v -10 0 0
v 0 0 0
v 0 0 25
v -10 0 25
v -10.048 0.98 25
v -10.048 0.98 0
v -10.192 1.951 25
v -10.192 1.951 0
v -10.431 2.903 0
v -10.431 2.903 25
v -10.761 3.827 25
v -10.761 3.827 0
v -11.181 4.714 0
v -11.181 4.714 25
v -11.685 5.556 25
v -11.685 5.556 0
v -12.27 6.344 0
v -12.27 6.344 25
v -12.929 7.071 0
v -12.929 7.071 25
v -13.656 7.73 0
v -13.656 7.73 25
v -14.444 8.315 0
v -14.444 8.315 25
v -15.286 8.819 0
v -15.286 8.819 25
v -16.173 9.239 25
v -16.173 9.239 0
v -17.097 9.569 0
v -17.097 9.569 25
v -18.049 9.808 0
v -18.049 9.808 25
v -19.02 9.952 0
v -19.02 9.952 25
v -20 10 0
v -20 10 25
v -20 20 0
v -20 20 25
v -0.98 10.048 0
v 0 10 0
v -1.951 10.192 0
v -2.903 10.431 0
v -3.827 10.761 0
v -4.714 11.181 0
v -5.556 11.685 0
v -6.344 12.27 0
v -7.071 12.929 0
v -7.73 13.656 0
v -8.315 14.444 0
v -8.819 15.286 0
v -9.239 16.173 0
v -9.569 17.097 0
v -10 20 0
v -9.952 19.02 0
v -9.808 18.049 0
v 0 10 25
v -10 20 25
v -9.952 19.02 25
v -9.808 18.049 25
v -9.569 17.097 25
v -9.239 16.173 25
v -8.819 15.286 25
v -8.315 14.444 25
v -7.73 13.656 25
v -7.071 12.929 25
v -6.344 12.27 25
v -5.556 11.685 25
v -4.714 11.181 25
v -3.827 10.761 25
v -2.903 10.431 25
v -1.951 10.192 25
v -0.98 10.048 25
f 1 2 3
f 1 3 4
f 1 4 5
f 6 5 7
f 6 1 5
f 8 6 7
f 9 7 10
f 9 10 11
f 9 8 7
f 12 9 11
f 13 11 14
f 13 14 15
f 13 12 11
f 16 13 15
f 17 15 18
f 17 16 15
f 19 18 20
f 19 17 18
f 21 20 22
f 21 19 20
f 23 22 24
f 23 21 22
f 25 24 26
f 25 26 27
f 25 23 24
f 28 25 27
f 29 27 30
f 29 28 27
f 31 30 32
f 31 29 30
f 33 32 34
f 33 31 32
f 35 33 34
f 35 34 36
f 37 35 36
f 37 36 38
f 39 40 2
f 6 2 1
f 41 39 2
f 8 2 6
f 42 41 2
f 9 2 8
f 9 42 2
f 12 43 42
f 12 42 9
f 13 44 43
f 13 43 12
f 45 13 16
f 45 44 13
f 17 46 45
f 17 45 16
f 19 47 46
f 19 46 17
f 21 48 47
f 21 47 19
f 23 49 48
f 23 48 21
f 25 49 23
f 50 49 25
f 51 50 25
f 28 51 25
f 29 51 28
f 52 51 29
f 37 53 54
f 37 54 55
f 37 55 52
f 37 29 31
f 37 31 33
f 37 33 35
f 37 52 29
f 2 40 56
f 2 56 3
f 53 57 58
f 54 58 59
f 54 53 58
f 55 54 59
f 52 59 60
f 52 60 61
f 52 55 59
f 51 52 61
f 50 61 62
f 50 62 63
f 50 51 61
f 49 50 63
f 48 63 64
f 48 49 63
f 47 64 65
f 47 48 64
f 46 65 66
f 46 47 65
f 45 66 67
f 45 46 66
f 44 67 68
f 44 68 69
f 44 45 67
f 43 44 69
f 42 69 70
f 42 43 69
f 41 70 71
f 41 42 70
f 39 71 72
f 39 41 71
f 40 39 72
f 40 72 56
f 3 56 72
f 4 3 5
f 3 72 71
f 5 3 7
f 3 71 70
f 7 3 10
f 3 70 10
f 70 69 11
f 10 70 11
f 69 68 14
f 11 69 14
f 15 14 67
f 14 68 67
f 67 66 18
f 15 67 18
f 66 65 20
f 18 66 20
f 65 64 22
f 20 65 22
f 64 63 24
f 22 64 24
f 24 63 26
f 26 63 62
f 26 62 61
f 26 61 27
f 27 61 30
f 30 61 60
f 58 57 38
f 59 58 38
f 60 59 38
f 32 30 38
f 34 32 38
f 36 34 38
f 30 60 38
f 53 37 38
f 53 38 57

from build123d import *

# Parameters (mm, degrees)
BOSS_EXTRUDE1_DEPTH = 25


with BuildPart() as part:
    # Sketch1 → Boss-Extrude1 (new body)
    with BuildSketch(Plane.XY):
        with BuildLine():
            Line((-20, 10), (-20, 20))
            Line((-20, 20), (-10, 20))
            ThreePointArc((-10, 20), (-7.071067812, 12.928932188), (0, 10))
            Line((0, 10), (0, 0))
            Line((0, 0), (-10, 0))
            ThreePointArc((-10, 0), (-12.928932188, 7.071067812), (-20, 10))
        make_face()
    extrude(amount=BOSS_EXTRUDE1_DEPTH)


solid = part.part
